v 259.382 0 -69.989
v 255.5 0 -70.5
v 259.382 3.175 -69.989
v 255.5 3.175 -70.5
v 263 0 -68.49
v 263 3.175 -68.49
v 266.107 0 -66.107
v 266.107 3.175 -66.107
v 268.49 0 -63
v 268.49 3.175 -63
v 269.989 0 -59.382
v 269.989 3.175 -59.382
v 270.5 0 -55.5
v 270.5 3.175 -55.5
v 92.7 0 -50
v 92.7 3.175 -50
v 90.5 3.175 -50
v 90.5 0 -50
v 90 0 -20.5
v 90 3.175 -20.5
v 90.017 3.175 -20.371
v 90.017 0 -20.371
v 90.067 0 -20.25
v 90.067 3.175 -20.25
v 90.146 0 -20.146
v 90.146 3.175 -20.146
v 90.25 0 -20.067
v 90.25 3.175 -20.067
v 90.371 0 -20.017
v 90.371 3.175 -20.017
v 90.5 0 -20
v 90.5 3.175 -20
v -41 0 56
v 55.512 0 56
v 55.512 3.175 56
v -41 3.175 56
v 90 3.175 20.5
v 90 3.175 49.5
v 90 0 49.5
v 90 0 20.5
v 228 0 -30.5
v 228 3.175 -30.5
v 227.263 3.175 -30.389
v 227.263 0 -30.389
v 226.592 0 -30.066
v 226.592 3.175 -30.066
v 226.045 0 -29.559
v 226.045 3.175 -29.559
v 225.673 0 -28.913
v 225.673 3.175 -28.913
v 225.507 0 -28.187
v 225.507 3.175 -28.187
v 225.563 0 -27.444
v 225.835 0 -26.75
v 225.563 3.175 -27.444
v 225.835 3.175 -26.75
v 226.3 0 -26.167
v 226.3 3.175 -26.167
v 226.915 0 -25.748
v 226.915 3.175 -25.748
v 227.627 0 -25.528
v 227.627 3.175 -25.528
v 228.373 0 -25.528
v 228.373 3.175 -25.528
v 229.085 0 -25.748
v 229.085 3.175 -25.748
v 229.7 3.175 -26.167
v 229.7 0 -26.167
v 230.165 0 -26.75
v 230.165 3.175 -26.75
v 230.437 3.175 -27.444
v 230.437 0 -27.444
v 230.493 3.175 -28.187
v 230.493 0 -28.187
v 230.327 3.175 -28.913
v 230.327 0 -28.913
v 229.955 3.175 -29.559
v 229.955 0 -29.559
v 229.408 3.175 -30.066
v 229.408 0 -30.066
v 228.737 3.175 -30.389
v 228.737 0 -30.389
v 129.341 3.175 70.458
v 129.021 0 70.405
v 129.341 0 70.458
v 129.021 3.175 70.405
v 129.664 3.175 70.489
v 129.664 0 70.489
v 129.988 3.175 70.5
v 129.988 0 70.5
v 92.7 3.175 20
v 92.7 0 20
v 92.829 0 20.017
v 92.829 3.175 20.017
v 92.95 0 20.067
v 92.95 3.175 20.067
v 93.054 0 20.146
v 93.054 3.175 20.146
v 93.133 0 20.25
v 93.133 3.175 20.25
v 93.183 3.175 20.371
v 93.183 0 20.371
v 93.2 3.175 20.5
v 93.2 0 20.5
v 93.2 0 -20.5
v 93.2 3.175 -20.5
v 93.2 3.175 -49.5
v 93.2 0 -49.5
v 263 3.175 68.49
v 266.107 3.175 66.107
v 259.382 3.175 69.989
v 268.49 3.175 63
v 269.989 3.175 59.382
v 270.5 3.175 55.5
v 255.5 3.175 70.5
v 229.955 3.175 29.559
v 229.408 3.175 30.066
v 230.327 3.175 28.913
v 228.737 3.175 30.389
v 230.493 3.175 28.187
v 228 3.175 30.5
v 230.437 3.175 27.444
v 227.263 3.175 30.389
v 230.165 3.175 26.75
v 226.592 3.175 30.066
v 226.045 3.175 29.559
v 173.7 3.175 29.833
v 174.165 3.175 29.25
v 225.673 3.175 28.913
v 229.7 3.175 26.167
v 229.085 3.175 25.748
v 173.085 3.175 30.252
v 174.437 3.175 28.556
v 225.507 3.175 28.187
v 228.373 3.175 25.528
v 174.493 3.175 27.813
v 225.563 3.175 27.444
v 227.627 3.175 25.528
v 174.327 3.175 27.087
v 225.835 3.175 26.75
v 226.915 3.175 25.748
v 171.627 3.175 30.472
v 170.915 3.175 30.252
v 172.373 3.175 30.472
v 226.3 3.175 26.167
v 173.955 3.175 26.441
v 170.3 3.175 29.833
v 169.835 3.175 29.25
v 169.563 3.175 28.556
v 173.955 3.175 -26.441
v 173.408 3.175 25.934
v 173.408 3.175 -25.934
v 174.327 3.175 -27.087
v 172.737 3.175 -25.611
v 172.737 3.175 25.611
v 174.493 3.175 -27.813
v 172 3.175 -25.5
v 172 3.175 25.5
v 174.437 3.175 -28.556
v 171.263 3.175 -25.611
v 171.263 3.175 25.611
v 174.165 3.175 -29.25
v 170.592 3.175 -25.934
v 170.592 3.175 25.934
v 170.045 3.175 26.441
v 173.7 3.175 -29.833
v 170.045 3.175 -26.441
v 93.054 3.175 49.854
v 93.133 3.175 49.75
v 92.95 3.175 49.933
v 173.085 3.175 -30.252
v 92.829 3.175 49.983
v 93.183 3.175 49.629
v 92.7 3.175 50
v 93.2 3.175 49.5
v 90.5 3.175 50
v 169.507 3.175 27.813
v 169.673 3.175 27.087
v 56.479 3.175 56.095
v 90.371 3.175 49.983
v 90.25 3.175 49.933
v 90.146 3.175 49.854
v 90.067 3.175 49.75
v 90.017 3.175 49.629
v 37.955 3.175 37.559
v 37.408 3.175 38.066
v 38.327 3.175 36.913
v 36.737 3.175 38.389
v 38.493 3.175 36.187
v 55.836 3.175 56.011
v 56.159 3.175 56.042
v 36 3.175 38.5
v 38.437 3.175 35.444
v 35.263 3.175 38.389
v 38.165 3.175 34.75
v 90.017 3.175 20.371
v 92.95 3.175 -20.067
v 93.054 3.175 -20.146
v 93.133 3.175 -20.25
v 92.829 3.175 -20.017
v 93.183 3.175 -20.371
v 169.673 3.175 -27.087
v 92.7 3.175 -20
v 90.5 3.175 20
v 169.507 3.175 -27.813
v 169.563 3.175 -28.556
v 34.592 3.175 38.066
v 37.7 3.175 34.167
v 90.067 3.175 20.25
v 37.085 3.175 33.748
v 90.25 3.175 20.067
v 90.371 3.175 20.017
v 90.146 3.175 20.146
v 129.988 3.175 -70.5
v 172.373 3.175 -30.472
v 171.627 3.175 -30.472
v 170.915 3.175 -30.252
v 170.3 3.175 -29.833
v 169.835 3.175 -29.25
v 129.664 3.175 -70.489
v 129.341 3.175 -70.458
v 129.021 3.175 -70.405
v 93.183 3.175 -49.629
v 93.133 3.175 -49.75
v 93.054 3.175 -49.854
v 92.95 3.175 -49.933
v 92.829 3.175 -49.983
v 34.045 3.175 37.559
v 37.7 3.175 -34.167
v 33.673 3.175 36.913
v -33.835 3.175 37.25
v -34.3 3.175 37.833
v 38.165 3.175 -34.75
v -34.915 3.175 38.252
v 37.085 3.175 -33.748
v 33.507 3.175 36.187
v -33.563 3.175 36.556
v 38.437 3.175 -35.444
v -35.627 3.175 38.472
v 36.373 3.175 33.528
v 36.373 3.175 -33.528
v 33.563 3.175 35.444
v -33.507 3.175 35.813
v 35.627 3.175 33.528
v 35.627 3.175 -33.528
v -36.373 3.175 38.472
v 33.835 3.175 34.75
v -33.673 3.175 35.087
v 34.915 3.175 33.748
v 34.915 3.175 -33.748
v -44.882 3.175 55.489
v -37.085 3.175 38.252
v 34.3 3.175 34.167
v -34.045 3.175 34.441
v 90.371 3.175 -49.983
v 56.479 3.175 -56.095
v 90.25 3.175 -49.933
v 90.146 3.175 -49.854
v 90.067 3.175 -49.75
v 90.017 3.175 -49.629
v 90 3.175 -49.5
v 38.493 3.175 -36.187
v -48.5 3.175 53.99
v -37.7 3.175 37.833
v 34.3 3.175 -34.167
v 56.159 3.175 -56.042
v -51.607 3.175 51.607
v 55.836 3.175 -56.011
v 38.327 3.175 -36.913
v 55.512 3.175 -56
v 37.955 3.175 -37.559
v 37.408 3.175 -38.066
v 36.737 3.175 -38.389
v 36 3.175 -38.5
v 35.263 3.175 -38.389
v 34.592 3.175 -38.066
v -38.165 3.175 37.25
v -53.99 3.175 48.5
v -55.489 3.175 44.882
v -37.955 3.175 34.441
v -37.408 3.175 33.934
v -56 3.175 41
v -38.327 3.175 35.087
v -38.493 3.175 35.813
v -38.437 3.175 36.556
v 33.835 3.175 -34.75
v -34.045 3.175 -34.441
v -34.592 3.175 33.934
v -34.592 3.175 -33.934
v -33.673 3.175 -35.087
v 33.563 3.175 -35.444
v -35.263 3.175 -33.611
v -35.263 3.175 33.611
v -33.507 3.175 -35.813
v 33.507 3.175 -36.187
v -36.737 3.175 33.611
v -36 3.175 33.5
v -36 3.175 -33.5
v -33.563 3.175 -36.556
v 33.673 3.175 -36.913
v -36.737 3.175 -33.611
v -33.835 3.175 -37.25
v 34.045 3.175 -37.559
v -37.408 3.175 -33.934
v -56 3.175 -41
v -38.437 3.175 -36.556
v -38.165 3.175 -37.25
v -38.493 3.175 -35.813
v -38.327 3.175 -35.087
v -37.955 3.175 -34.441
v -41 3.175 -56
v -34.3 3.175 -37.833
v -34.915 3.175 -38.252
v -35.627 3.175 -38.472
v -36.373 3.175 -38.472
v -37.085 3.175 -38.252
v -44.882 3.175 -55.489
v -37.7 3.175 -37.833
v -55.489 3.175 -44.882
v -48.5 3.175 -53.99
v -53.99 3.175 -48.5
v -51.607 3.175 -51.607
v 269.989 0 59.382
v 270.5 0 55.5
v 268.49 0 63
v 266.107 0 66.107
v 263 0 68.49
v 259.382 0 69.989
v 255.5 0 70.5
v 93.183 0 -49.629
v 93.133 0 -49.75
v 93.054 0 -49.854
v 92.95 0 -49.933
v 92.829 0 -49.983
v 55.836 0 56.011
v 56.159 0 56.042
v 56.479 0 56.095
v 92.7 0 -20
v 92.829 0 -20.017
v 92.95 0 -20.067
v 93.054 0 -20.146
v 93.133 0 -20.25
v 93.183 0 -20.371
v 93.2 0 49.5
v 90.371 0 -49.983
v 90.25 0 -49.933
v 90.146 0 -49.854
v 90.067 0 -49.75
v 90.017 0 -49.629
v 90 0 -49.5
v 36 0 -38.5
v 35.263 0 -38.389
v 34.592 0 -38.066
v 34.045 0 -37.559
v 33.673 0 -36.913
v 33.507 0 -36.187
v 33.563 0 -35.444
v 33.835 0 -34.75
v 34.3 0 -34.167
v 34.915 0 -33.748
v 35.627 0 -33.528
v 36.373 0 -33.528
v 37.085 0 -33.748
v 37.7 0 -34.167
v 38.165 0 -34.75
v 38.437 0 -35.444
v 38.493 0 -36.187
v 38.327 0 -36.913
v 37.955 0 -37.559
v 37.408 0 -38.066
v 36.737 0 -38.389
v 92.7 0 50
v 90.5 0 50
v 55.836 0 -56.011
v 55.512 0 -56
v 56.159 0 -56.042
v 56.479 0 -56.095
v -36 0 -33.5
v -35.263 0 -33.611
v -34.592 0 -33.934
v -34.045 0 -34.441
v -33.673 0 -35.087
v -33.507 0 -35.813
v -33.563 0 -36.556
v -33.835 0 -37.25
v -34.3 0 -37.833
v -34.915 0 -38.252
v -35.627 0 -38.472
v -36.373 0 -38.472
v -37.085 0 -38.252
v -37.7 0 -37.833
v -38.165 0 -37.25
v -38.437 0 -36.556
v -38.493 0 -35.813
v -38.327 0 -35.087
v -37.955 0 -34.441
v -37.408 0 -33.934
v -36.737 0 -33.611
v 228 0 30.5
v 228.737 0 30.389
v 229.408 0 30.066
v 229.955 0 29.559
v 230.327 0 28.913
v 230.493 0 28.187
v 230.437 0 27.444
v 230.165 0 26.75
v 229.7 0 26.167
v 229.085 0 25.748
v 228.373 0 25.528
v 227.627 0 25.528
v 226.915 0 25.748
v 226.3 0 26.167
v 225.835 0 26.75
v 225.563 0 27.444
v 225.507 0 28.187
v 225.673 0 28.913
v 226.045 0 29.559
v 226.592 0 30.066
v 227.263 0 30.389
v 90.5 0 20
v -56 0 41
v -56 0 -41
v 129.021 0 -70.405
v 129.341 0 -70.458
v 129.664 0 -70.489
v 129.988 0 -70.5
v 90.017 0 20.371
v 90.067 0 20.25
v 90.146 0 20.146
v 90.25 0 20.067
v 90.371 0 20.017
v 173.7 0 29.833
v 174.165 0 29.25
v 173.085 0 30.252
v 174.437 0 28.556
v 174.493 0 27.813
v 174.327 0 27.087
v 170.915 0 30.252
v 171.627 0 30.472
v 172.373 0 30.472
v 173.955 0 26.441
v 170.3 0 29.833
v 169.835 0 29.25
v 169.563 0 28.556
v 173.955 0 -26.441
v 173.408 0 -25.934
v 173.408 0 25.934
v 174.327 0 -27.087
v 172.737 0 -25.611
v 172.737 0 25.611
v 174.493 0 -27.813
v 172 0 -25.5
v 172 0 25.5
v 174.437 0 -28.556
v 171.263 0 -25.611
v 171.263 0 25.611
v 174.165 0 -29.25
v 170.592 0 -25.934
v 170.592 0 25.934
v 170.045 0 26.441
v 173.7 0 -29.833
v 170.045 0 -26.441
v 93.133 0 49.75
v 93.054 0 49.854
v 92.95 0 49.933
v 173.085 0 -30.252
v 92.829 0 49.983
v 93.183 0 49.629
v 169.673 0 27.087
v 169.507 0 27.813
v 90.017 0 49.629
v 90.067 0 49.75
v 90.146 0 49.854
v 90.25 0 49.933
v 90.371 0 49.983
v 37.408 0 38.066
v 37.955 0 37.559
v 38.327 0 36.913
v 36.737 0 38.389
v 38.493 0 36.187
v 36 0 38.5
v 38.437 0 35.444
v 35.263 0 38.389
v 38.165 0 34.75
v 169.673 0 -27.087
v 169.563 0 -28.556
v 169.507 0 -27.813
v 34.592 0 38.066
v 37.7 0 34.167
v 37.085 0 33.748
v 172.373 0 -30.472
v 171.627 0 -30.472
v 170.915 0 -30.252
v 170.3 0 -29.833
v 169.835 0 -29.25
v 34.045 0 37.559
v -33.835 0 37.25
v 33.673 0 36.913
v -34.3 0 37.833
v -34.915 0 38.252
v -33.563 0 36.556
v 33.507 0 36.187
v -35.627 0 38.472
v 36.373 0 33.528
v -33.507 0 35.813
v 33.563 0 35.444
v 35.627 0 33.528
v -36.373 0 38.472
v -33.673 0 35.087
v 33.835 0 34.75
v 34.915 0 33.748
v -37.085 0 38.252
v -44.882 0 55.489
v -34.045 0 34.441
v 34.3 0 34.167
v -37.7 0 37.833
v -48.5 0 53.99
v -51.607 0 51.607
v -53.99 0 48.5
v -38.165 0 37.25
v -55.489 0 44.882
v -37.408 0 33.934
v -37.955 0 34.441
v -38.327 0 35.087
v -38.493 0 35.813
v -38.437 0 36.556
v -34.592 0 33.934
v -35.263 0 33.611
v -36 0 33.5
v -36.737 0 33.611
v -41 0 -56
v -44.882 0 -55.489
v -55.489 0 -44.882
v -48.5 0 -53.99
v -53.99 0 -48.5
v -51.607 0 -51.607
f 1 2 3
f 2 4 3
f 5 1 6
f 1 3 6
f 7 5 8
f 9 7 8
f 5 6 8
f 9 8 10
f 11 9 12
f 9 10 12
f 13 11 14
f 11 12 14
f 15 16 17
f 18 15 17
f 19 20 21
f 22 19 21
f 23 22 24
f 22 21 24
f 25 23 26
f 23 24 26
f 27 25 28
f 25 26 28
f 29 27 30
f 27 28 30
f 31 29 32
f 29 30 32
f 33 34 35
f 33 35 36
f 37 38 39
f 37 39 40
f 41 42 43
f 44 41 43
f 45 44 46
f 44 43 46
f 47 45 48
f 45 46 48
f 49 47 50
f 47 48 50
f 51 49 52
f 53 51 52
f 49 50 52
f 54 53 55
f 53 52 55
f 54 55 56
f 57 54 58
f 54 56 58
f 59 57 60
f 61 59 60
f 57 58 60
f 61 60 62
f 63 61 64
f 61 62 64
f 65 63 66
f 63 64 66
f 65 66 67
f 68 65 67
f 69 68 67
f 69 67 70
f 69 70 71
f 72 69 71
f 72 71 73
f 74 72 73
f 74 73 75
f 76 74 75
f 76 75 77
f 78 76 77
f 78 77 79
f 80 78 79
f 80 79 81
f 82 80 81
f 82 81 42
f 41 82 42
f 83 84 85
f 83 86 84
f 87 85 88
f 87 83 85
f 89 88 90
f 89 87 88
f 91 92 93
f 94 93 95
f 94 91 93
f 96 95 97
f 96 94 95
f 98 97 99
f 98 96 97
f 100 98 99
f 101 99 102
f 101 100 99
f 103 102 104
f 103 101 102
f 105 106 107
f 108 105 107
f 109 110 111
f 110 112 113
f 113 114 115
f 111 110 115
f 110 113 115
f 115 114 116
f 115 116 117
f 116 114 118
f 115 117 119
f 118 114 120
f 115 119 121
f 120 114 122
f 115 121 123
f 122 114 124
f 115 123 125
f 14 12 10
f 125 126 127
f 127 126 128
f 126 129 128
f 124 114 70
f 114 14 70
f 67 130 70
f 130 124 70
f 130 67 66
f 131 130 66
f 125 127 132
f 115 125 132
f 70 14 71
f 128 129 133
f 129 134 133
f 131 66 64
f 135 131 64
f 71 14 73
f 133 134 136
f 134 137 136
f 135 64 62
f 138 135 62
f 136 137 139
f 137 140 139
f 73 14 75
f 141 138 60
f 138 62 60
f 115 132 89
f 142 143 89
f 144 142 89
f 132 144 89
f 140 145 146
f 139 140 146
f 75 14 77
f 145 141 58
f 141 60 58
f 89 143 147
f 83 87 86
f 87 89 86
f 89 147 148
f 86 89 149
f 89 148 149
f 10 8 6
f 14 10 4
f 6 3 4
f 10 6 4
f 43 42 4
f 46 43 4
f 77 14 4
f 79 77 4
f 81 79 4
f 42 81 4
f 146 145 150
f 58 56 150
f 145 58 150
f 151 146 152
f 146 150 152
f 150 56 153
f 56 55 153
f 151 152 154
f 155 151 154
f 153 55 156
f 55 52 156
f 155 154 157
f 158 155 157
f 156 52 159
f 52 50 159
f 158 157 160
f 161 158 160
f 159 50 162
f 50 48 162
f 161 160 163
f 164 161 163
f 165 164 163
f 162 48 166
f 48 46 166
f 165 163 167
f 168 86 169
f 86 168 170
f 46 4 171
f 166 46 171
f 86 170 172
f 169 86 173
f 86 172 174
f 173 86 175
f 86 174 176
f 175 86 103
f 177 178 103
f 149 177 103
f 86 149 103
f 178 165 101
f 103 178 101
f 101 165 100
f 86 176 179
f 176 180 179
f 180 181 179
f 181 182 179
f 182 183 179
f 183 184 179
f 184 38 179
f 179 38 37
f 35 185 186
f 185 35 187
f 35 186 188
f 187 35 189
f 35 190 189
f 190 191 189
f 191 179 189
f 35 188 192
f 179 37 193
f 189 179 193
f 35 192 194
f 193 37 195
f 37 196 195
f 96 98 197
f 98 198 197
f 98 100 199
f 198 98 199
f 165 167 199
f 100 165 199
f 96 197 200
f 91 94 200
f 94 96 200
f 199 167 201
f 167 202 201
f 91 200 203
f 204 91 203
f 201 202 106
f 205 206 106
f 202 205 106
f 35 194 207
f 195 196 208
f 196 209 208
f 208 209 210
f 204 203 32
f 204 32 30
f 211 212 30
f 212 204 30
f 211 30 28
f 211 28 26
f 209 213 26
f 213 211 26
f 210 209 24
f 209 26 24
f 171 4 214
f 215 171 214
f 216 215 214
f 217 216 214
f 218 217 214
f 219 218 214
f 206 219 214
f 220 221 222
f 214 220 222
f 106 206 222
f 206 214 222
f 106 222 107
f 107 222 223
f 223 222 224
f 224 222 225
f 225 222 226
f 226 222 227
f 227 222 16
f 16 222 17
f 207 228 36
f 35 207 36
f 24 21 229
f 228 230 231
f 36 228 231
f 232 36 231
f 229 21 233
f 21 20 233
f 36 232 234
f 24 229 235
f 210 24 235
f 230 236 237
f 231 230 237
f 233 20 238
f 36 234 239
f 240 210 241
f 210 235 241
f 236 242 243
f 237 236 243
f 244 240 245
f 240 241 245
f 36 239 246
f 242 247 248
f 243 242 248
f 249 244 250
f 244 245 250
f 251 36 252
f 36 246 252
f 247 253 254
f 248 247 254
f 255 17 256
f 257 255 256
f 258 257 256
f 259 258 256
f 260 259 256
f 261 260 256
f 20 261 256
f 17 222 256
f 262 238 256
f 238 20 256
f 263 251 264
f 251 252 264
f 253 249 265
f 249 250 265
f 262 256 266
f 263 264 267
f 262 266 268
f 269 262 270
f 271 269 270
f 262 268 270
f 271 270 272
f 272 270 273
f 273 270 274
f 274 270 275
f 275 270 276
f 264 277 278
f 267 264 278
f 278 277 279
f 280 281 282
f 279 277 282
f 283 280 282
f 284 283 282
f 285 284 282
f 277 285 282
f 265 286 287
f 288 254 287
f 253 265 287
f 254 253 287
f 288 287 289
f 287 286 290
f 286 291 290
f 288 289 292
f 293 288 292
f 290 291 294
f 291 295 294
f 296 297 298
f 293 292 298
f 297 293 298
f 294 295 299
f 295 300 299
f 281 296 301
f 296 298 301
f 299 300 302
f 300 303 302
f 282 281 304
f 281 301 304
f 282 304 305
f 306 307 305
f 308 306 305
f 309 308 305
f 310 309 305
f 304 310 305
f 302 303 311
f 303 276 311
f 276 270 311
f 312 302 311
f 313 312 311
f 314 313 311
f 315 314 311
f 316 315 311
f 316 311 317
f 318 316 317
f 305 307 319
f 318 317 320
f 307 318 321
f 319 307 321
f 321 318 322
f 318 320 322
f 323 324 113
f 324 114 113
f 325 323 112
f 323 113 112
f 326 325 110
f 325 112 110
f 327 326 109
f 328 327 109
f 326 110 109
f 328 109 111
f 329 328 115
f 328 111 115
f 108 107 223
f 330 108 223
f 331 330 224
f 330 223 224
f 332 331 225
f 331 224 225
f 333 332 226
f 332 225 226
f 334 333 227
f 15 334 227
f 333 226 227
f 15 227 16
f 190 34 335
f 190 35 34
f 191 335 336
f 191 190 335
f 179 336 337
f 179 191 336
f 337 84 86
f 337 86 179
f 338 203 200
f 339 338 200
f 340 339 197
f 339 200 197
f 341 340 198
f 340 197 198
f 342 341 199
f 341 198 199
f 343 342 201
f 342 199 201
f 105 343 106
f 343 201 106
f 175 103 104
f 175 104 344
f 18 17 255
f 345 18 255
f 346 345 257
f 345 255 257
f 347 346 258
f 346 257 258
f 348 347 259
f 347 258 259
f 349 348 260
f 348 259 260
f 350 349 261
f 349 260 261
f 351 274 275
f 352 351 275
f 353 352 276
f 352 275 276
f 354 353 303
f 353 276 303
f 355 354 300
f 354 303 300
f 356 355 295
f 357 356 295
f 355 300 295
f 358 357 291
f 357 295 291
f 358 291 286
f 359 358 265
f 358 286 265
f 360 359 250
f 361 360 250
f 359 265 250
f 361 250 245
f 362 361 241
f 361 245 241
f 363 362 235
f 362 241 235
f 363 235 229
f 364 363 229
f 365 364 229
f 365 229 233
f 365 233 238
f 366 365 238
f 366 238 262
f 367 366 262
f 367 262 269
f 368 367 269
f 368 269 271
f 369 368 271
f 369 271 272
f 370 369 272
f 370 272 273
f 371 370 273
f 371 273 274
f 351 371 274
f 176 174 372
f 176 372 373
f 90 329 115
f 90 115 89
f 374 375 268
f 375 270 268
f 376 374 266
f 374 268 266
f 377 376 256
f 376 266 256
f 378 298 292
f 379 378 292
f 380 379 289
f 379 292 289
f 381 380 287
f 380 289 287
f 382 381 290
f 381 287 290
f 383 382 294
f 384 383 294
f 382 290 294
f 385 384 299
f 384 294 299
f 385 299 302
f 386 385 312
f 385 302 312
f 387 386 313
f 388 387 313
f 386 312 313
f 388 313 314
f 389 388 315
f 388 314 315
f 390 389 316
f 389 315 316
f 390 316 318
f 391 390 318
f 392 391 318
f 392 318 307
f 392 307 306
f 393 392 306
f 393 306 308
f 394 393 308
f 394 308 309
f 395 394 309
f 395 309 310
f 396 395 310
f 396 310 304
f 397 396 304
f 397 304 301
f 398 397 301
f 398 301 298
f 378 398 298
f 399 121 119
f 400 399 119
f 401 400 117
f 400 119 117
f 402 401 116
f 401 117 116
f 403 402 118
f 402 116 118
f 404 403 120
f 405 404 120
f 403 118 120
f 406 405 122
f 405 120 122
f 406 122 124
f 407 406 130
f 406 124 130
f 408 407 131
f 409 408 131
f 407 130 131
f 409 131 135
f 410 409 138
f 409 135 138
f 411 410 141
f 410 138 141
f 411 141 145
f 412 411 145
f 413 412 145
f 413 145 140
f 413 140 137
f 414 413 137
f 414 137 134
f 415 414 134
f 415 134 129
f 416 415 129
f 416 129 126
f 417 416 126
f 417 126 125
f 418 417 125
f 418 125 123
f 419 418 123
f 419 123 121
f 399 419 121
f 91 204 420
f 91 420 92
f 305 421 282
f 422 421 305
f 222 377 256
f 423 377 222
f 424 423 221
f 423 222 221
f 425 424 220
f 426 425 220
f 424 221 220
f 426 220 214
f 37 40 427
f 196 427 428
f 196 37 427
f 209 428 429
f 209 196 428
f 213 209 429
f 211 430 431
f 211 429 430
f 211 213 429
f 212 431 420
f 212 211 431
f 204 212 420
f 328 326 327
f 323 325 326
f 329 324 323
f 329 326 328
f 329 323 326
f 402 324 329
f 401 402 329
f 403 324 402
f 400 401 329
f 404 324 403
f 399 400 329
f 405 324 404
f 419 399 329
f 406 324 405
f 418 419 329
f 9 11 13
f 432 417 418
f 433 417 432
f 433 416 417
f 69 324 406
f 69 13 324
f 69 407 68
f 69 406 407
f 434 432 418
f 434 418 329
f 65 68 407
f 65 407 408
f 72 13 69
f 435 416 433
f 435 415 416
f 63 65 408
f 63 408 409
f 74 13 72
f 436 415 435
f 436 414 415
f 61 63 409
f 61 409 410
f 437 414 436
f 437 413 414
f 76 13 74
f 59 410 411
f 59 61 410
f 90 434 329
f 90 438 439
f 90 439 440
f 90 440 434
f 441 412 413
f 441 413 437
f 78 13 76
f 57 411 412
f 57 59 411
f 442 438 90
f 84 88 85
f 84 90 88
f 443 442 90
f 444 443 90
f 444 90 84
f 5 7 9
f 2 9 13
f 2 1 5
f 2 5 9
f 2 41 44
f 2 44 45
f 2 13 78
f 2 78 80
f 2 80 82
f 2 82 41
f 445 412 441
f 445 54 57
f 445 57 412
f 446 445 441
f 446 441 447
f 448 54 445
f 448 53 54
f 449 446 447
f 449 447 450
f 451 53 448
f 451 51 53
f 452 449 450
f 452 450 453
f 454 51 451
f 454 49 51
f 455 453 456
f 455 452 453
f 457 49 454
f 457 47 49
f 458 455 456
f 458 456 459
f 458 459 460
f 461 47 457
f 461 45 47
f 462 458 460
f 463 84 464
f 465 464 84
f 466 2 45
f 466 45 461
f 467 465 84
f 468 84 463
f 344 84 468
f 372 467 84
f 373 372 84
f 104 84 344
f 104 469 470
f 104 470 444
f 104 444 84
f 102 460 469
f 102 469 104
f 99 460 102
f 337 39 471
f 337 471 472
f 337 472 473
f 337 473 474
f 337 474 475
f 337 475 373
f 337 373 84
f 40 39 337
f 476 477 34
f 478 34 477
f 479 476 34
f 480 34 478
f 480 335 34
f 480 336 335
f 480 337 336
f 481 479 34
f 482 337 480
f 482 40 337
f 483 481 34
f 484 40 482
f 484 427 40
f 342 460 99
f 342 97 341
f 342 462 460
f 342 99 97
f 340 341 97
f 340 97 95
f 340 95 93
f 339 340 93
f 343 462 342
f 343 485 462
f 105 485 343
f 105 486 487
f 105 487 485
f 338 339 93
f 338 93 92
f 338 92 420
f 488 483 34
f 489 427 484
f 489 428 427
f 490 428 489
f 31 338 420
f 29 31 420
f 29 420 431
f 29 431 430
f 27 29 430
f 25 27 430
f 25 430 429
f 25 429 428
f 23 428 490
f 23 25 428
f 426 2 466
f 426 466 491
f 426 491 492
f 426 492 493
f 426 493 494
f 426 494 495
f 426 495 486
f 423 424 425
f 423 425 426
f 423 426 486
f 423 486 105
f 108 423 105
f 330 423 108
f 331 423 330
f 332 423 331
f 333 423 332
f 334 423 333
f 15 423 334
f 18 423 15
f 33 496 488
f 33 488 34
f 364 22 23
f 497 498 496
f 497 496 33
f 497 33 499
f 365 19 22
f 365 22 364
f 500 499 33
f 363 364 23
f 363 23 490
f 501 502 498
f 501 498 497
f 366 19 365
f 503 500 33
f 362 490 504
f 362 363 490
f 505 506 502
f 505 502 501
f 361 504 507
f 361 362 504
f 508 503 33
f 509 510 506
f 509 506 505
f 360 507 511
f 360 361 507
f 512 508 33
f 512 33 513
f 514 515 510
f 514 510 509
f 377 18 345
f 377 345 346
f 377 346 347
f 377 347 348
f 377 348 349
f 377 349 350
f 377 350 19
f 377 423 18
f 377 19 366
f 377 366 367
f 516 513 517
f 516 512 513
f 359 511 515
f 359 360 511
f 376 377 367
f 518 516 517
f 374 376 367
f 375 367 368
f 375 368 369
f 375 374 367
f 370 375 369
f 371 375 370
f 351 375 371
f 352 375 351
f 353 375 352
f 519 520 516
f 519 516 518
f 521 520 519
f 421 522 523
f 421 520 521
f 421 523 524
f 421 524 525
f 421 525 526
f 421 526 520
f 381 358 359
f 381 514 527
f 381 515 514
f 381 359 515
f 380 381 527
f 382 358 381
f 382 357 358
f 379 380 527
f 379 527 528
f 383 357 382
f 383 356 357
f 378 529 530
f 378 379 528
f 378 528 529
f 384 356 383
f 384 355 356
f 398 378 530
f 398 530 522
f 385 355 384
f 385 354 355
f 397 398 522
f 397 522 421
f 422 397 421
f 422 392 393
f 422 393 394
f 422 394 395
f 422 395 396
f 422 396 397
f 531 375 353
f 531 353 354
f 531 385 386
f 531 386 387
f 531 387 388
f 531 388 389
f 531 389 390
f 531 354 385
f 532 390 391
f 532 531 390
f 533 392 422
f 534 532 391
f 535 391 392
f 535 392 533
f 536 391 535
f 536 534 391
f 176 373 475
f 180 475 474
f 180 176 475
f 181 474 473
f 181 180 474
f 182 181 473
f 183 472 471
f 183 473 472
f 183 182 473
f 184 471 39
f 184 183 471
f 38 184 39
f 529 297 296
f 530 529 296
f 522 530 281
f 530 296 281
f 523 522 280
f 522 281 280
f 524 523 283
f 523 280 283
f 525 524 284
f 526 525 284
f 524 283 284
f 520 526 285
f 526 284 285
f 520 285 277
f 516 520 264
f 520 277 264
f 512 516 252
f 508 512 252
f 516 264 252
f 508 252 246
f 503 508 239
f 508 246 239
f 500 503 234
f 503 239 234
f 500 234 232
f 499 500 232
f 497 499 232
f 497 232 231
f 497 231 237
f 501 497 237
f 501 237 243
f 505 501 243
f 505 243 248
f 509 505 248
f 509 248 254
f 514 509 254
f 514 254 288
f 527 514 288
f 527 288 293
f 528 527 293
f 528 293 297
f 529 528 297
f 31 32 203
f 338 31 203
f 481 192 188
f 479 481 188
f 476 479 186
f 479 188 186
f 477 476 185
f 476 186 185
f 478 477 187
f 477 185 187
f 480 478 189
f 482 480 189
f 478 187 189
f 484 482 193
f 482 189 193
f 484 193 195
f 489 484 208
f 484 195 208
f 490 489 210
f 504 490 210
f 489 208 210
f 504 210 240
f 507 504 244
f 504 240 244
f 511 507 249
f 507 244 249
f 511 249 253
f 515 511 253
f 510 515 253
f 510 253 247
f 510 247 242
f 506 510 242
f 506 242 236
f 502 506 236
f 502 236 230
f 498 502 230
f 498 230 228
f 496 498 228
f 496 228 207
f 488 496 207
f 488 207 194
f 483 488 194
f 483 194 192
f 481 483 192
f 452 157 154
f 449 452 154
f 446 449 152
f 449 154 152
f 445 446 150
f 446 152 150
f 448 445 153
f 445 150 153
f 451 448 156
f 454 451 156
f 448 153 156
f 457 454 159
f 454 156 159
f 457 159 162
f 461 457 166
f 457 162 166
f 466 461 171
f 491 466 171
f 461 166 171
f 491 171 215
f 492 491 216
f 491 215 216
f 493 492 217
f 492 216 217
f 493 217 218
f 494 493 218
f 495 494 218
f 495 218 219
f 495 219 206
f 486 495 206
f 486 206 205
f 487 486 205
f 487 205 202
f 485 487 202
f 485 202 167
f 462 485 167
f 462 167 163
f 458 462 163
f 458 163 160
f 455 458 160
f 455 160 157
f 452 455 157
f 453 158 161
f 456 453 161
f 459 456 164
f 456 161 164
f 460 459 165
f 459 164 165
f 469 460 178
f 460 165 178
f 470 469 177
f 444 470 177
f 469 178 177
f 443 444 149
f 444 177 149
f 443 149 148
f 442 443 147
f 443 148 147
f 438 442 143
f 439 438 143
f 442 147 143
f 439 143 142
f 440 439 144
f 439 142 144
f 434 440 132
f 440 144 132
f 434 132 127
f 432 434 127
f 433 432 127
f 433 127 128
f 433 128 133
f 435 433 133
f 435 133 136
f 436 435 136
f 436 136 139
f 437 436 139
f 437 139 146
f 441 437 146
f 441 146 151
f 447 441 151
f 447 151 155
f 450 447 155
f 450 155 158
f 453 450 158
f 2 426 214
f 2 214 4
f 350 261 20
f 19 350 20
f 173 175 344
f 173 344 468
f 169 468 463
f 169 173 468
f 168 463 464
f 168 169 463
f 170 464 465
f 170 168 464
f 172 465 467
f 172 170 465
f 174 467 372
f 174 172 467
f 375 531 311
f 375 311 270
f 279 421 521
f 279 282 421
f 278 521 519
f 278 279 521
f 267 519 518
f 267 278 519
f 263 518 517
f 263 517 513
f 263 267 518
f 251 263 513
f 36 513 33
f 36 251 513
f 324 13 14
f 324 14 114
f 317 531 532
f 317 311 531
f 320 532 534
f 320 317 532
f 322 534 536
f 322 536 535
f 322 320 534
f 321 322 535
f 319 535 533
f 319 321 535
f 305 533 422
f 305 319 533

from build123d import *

# Parameters (mm, degrees)
BOSS_EXTRUDE1_DEPTH = 3.175
SKETCH5_R           = 2.5
CUT_EXTRUDE2_DEPTH  = 280.554253455
CUT_EXTRUDE3_DEPTH  = 280.554253455
FILLET1_R           = 15
FILLET2_R           = 5
SKETCH7_R           = 2.5
CUT_EXTRUDE4_DEPTH  = 280.554253455


with BuildPart() as part:
    # Sketch1 → Boss-Extrude1 (new body)
    with BuildSketch(Plane(origin=(0, 0, 0), x_dir=(1, 0, 0), z_dir=(0, 1, 0))):
        Polygon((56, 56), (129.5, 70.5), (270.5, 70.5), (270.5, -70.5), (129.5, -70.5), (56, -56), (-56, -56), (-56, 56), align=None)
    extrude(amount=BOSS_EXTRUDE1_DEPTH)

    # Sketch5 → Cut-Extrude2 (cut, through all)
    with BuildSketch(Plane(origin=(0, 3.175, 0), x_dir=(1, 0, 0), z_dir=(0, 1, 0))):
        with Locations(Location((172, 28, 0), (0, 0, 270))):
            Circle(SKETCH5_R)
        with Locations(Location((228, 28, 0), (0, 0, 90))):
            Circle(SKETCH5_R)
        with Locations(Location((228, -28, 0), (0, 0, 270))):
            Circle(SKETCH5_R)
        with Locations(Location((172, -28, 0), (0, 0, 90))):
            Circle(SKETCH5_R)
    extrude(amount=-CUT_EXTRUDE2_DEPTH, mode=Mode.SUBTRACT)

    # Sketch6 → Cut-Extrude3 (cut, through all)
    with BuildSketch(Plane(origin=(0, 3.175, 0), x_dir=(1, 0, 0), z_dir=(0, 1, 0))):
        with BuildLine():
            Line((93.2, 20.5), (93.2, 49.5))
            ThreePointArc((93.2, 49.5), (93.053553391, 49.853553391), (92.7, 50))
            Line((92.7, 50), (90.5, 50))
            ThreePointArc((90.5, 50), (90.146446609, 49.853553391), (90, 49.5))
            Line((90, 49.5), (90, 20.5))
            ThreePointArc((90, 20.5), (90.146446609, 20.146446609), (90.5, 20))
            Line((90.5, 20), (92.7, 20))
            ThreePointArc((92.7, 20), (93.053553391, 20.146446609), (93.2, 20.5))
        make_face()
        with BuildLine():
            Line((90.5, -20), (92.7, -20))
            ThreePointArc((92.7, -20), (93.053553391, -20.146446609), (93.2, -20.5))
            Line((93.2, -20.5), (93.2, -49.5))
            ThreePointArc((93.2, -49.5), (93.053553391, -49.853553391), (92.7, -50))
            Line((92.7, -50), (90.5, -50))
            ThreePointArc((90.5, -50), (90.146446609, -49.853553391), (90, -49.5))
            Line((90, -49.5), (90, -20.5))
            ThreePointArc((90, -20.5), (90.146446609, -20.146446609), (90.5, -20))
        make_face()
    extrude(amount=-CUT_EXTRUDE3_DEPTH, mode=Mode.SUBTRACT)

    # Fillet1
    fillet1_edges = [part.edges().sort_by_distance(p)[0] for p in [
        (270.5, 1.5875, 70.5),
        (-56, 1.5875, 56),
        (-56, 1.5875, -56),
        (270.5, 1.5875, -70.5),
    ]]
    fillet(fillet1_edges, radius=FILLET1_R)

    # Fillet2
    fillet2_edges = [part.edges().sort_by_distance(p)[0] for p in [
        (129.5, 1.5875, 70.5),
        (56, 1.5875, 56),
        (56, 1.5875, -56),
        (129.5, 1.5875, -70.5),
    ]]
    fillet(fillet2_edges, radius=FILLET2_R)

    # Sketch7 → Cut-Extrude4 (cut, through all)
    with BuildSketch(Plane(origin=(0, 3.175, 0), x_dir=(1, 0, 0), z_dir=(0, 1, 0))):
        with Locations(Location((-36, 36, 0), (0, 0, 270))):
            Circle(SKETCH7_R)
        with Locations(Location((36, 36, 0), (0, 0, 90))):
            Circle(SKETCH7_R)
        with Locations(Location((-36, -36, 0), (0, 0, 90))):
            Circle(SKETCH7_R)
        with Locations(Location((36, -36, 0), (0, 0, 270))):
            Circle(SKETCH7_R)
    extrude(amount=-CUT_EXTRUDE4_DEPTH, mode=Mode.SUBTRACT)


solid = part.part
